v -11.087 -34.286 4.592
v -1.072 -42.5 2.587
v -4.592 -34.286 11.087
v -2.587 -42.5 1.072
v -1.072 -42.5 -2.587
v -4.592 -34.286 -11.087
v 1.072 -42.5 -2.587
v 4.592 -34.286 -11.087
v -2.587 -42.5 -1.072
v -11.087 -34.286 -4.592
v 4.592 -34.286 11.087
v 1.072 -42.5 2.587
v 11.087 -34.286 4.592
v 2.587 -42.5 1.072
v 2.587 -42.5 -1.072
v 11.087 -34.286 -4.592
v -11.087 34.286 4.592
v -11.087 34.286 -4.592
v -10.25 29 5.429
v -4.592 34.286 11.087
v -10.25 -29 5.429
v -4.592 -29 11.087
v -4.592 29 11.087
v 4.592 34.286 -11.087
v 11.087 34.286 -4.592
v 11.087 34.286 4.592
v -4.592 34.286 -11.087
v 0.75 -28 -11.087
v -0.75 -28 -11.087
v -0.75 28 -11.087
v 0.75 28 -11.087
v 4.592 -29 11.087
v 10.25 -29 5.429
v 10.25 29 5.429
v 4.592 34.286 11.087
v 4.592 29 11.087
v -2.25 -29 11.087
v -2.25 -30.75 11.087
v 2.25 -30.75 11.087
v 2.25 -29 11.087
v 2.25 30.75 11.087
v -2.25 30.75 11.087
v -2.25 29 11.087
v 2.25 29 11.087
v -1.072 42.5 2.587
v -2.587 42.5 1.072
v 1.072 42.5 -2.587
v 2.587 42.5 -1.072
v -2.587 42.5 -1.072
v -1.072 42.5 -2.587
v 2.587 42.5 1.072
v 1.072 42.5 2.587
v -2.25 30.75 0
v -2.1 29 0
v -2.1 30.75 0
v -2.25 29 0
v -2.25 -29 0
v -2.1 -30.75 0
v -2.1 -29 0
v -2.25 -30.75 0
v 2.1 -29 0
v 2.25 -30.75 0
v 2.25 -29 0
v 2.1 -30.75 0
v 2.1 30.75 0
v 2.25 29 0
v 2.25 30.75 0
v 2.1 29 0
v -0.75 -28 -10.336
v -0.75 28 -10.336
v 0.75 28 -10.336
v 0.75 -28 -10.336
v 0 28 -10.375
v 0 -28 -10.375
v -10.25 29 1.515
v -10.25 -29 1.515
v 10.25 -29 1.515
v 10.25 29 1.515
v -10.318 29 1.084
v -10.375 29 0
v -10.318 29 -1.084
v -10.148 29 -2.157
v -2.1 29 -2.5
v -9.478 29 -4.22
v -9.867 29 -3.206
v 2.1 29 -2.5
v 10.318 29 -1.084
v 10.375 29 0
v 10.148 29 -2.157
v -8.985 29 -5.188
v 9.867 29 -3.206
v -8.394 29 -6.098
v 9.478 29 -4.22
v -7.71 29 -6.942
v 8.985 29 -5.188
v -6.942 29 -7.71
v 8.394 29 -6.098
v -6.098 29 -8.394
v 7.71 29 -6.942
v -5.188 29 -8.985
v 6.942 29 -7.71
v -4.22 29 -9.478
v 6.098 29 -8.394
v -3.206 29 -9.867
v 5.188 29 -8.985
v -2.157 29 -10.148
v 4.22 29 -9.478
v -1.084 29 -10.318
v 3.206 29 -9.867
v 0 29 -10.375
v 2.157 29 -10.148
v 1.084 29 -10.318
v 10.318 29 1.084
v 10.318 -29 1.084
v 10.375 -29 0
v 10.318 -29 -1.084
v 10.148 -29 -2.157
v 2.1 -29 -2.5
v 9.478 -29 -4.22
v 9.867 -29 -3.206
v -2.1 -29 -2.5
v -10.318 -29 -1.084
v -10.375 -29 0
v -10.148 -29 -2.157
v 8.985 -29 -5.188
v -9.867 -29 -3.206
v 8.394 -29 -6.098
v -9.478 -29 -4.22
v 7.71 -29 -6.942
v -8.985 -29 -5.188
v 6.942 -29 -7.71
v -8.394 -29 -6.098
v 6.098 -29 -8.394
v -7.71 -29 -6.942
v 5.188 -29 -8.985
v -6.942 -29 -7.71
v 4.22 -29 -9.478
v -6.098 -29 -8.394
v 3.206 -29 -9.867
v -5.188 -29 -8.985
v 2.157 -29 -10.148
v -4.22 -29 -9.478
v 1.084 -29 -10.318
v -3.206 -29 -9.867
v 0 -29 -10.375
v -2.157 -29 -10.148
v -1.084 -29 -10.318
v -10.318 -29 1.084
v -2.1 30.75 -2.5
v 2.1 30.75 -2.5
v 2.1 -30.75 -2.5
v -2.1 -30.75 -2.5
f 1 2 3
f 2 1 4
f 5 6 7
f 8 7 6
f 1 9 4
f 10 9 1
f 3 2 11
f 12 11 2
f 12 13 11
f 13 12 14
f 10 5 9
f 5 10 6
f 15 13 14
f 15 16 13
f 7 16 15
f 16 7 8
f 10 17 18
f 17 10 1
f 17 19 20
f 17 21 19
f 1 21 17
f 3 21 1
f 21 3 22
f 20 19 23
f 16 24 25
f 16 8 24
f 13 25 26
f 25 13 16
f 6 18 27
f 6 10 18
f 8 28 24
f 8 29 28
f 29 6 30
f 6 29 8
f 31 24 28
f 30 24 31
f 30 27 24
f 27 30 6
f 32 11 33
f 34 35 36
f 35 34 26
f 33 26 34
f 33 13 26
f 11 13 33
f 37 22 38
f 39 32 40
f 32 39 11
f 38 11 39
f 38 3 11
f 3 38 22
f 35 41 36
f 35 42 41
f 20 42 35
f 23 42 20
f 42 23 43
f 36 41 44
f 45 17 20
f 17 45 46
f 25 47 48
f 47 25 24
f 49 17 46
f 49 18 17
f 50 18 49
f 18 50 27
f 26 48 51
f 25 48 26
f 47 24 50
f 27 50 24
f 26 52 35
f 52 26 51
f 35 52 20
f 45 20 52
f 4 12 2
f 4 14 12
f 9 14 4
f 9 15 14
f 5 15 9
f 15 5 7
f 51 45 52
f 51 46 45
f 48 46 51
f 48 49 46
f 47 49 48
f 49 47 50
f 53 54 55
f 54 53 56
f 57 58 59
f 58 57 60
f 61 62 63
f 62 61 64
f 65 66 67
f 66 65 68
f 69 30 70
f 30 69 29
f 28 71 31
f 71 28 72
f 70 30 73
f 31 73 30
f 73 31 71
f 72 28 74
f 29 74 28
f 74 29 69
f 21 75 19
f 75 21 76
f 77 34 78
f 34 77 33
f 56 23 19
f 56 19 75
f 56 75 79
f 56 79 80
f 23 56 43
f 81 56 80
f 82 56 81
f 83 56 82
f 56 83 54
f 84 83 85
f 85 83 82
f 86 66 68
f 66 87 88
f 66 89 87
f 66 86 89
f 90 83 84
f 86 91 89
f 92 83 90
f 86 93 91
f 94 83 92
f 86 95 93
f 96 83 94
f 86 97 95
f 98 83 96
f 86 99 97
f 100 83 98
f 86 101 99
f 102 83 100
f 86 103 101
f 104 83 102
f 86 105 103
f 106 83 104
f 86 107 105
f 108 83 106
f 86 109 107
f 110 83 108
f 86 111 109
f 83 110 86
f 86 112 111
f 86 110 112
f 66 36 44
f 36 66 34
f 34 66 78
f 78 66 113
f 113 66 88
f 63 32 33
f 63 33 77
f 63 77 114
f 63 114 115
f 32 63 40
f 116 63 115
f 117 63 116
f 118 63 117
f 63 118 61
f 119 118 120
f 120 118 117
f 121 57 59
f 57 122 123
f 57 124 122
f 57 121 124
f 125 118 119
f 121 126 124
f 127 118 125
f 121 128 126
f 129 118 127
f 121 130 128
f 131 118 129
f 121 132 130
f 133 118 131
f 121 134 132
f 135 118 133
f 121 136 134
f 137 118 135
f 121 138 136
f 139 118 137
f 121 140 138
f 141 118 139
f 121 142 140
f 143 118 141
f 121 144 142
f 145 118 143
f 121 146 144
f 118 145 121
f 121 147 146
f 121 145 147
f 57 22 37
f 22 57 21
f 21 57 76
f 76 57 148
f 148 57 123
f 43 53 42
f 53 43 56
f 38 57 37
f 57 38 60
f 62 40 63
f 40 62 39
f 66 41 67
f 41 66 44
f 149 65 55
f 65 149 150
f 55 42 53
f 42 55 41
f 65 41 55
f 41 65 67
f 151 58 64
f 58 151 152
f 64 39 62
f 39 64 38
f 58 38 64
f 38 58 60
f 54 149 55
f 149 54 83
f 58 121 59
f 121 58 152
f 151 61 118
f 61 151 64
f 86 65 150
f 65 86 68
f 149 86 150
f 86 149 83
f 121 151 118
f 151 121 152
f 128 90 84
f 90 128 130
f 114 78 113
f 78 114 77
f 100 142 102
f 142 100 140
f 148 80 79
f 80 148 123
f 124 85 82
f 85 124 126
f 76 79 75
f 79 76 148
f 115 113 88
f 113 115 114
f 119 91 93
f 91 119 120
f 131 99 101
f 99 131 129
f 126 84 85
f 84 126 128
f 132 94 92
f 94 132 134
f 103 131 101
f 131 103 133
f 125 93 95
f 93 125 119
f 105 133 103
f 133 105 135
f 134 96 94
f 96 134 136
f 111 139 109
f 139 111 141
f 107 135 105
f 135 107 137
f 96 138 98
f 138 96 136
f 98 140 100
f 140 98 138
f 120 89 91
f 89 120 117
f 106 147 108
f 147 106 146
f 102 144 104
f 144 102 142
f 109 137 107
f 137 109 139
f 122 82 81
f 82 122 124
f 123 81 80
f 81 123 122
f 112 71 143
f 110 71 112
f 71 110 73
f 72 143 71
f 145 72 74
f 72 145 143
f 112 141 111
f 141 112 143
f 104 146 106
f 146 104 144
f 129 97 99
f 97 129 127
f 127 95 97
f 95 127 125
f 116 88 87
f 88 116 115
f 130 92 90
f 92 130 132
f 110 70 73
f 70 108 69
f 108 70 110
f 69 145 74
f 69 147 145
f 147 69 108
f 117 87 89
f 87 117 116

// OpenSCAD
rotate([0,-90,0])difference(){
intersection(){
rotate([90,0,0])rotate([0,0,45/2])cylinder(r=12,h=85,$fn=8,center=true);
union(){translate([0,-32.5,0])rotate([90,0,0])rotate([0,0,45/2])cylinder(r1=28,r2=0,h=25,$fn=8,center=true);
rotate([90,0,0])rotate([0,0,45/2])cylinder(r=12,h=40,$fn=8,center=true);
mirror([0,1,0])translate([0,-32.5,0])rotate([90,0,0])rotate([0,0,45/2])cylinder(r1=28,r2=0,h=25,$fn=8,center=true);
}
}

translate([-20.5/2,0,0])cube([20.5,56,1.5],true);
translate([20.5/2,0,0])cube([20.5,58,20.5],true);
translate([20.5/2,0,0])cube([20.5,61.5,4.5],true);
cube([5,61.5,4.2],true);
rotate([90,0,0])cylinder(h=58,r=20.75/2,$fn=60,center=true);

}

*cube([61,4,4]);
